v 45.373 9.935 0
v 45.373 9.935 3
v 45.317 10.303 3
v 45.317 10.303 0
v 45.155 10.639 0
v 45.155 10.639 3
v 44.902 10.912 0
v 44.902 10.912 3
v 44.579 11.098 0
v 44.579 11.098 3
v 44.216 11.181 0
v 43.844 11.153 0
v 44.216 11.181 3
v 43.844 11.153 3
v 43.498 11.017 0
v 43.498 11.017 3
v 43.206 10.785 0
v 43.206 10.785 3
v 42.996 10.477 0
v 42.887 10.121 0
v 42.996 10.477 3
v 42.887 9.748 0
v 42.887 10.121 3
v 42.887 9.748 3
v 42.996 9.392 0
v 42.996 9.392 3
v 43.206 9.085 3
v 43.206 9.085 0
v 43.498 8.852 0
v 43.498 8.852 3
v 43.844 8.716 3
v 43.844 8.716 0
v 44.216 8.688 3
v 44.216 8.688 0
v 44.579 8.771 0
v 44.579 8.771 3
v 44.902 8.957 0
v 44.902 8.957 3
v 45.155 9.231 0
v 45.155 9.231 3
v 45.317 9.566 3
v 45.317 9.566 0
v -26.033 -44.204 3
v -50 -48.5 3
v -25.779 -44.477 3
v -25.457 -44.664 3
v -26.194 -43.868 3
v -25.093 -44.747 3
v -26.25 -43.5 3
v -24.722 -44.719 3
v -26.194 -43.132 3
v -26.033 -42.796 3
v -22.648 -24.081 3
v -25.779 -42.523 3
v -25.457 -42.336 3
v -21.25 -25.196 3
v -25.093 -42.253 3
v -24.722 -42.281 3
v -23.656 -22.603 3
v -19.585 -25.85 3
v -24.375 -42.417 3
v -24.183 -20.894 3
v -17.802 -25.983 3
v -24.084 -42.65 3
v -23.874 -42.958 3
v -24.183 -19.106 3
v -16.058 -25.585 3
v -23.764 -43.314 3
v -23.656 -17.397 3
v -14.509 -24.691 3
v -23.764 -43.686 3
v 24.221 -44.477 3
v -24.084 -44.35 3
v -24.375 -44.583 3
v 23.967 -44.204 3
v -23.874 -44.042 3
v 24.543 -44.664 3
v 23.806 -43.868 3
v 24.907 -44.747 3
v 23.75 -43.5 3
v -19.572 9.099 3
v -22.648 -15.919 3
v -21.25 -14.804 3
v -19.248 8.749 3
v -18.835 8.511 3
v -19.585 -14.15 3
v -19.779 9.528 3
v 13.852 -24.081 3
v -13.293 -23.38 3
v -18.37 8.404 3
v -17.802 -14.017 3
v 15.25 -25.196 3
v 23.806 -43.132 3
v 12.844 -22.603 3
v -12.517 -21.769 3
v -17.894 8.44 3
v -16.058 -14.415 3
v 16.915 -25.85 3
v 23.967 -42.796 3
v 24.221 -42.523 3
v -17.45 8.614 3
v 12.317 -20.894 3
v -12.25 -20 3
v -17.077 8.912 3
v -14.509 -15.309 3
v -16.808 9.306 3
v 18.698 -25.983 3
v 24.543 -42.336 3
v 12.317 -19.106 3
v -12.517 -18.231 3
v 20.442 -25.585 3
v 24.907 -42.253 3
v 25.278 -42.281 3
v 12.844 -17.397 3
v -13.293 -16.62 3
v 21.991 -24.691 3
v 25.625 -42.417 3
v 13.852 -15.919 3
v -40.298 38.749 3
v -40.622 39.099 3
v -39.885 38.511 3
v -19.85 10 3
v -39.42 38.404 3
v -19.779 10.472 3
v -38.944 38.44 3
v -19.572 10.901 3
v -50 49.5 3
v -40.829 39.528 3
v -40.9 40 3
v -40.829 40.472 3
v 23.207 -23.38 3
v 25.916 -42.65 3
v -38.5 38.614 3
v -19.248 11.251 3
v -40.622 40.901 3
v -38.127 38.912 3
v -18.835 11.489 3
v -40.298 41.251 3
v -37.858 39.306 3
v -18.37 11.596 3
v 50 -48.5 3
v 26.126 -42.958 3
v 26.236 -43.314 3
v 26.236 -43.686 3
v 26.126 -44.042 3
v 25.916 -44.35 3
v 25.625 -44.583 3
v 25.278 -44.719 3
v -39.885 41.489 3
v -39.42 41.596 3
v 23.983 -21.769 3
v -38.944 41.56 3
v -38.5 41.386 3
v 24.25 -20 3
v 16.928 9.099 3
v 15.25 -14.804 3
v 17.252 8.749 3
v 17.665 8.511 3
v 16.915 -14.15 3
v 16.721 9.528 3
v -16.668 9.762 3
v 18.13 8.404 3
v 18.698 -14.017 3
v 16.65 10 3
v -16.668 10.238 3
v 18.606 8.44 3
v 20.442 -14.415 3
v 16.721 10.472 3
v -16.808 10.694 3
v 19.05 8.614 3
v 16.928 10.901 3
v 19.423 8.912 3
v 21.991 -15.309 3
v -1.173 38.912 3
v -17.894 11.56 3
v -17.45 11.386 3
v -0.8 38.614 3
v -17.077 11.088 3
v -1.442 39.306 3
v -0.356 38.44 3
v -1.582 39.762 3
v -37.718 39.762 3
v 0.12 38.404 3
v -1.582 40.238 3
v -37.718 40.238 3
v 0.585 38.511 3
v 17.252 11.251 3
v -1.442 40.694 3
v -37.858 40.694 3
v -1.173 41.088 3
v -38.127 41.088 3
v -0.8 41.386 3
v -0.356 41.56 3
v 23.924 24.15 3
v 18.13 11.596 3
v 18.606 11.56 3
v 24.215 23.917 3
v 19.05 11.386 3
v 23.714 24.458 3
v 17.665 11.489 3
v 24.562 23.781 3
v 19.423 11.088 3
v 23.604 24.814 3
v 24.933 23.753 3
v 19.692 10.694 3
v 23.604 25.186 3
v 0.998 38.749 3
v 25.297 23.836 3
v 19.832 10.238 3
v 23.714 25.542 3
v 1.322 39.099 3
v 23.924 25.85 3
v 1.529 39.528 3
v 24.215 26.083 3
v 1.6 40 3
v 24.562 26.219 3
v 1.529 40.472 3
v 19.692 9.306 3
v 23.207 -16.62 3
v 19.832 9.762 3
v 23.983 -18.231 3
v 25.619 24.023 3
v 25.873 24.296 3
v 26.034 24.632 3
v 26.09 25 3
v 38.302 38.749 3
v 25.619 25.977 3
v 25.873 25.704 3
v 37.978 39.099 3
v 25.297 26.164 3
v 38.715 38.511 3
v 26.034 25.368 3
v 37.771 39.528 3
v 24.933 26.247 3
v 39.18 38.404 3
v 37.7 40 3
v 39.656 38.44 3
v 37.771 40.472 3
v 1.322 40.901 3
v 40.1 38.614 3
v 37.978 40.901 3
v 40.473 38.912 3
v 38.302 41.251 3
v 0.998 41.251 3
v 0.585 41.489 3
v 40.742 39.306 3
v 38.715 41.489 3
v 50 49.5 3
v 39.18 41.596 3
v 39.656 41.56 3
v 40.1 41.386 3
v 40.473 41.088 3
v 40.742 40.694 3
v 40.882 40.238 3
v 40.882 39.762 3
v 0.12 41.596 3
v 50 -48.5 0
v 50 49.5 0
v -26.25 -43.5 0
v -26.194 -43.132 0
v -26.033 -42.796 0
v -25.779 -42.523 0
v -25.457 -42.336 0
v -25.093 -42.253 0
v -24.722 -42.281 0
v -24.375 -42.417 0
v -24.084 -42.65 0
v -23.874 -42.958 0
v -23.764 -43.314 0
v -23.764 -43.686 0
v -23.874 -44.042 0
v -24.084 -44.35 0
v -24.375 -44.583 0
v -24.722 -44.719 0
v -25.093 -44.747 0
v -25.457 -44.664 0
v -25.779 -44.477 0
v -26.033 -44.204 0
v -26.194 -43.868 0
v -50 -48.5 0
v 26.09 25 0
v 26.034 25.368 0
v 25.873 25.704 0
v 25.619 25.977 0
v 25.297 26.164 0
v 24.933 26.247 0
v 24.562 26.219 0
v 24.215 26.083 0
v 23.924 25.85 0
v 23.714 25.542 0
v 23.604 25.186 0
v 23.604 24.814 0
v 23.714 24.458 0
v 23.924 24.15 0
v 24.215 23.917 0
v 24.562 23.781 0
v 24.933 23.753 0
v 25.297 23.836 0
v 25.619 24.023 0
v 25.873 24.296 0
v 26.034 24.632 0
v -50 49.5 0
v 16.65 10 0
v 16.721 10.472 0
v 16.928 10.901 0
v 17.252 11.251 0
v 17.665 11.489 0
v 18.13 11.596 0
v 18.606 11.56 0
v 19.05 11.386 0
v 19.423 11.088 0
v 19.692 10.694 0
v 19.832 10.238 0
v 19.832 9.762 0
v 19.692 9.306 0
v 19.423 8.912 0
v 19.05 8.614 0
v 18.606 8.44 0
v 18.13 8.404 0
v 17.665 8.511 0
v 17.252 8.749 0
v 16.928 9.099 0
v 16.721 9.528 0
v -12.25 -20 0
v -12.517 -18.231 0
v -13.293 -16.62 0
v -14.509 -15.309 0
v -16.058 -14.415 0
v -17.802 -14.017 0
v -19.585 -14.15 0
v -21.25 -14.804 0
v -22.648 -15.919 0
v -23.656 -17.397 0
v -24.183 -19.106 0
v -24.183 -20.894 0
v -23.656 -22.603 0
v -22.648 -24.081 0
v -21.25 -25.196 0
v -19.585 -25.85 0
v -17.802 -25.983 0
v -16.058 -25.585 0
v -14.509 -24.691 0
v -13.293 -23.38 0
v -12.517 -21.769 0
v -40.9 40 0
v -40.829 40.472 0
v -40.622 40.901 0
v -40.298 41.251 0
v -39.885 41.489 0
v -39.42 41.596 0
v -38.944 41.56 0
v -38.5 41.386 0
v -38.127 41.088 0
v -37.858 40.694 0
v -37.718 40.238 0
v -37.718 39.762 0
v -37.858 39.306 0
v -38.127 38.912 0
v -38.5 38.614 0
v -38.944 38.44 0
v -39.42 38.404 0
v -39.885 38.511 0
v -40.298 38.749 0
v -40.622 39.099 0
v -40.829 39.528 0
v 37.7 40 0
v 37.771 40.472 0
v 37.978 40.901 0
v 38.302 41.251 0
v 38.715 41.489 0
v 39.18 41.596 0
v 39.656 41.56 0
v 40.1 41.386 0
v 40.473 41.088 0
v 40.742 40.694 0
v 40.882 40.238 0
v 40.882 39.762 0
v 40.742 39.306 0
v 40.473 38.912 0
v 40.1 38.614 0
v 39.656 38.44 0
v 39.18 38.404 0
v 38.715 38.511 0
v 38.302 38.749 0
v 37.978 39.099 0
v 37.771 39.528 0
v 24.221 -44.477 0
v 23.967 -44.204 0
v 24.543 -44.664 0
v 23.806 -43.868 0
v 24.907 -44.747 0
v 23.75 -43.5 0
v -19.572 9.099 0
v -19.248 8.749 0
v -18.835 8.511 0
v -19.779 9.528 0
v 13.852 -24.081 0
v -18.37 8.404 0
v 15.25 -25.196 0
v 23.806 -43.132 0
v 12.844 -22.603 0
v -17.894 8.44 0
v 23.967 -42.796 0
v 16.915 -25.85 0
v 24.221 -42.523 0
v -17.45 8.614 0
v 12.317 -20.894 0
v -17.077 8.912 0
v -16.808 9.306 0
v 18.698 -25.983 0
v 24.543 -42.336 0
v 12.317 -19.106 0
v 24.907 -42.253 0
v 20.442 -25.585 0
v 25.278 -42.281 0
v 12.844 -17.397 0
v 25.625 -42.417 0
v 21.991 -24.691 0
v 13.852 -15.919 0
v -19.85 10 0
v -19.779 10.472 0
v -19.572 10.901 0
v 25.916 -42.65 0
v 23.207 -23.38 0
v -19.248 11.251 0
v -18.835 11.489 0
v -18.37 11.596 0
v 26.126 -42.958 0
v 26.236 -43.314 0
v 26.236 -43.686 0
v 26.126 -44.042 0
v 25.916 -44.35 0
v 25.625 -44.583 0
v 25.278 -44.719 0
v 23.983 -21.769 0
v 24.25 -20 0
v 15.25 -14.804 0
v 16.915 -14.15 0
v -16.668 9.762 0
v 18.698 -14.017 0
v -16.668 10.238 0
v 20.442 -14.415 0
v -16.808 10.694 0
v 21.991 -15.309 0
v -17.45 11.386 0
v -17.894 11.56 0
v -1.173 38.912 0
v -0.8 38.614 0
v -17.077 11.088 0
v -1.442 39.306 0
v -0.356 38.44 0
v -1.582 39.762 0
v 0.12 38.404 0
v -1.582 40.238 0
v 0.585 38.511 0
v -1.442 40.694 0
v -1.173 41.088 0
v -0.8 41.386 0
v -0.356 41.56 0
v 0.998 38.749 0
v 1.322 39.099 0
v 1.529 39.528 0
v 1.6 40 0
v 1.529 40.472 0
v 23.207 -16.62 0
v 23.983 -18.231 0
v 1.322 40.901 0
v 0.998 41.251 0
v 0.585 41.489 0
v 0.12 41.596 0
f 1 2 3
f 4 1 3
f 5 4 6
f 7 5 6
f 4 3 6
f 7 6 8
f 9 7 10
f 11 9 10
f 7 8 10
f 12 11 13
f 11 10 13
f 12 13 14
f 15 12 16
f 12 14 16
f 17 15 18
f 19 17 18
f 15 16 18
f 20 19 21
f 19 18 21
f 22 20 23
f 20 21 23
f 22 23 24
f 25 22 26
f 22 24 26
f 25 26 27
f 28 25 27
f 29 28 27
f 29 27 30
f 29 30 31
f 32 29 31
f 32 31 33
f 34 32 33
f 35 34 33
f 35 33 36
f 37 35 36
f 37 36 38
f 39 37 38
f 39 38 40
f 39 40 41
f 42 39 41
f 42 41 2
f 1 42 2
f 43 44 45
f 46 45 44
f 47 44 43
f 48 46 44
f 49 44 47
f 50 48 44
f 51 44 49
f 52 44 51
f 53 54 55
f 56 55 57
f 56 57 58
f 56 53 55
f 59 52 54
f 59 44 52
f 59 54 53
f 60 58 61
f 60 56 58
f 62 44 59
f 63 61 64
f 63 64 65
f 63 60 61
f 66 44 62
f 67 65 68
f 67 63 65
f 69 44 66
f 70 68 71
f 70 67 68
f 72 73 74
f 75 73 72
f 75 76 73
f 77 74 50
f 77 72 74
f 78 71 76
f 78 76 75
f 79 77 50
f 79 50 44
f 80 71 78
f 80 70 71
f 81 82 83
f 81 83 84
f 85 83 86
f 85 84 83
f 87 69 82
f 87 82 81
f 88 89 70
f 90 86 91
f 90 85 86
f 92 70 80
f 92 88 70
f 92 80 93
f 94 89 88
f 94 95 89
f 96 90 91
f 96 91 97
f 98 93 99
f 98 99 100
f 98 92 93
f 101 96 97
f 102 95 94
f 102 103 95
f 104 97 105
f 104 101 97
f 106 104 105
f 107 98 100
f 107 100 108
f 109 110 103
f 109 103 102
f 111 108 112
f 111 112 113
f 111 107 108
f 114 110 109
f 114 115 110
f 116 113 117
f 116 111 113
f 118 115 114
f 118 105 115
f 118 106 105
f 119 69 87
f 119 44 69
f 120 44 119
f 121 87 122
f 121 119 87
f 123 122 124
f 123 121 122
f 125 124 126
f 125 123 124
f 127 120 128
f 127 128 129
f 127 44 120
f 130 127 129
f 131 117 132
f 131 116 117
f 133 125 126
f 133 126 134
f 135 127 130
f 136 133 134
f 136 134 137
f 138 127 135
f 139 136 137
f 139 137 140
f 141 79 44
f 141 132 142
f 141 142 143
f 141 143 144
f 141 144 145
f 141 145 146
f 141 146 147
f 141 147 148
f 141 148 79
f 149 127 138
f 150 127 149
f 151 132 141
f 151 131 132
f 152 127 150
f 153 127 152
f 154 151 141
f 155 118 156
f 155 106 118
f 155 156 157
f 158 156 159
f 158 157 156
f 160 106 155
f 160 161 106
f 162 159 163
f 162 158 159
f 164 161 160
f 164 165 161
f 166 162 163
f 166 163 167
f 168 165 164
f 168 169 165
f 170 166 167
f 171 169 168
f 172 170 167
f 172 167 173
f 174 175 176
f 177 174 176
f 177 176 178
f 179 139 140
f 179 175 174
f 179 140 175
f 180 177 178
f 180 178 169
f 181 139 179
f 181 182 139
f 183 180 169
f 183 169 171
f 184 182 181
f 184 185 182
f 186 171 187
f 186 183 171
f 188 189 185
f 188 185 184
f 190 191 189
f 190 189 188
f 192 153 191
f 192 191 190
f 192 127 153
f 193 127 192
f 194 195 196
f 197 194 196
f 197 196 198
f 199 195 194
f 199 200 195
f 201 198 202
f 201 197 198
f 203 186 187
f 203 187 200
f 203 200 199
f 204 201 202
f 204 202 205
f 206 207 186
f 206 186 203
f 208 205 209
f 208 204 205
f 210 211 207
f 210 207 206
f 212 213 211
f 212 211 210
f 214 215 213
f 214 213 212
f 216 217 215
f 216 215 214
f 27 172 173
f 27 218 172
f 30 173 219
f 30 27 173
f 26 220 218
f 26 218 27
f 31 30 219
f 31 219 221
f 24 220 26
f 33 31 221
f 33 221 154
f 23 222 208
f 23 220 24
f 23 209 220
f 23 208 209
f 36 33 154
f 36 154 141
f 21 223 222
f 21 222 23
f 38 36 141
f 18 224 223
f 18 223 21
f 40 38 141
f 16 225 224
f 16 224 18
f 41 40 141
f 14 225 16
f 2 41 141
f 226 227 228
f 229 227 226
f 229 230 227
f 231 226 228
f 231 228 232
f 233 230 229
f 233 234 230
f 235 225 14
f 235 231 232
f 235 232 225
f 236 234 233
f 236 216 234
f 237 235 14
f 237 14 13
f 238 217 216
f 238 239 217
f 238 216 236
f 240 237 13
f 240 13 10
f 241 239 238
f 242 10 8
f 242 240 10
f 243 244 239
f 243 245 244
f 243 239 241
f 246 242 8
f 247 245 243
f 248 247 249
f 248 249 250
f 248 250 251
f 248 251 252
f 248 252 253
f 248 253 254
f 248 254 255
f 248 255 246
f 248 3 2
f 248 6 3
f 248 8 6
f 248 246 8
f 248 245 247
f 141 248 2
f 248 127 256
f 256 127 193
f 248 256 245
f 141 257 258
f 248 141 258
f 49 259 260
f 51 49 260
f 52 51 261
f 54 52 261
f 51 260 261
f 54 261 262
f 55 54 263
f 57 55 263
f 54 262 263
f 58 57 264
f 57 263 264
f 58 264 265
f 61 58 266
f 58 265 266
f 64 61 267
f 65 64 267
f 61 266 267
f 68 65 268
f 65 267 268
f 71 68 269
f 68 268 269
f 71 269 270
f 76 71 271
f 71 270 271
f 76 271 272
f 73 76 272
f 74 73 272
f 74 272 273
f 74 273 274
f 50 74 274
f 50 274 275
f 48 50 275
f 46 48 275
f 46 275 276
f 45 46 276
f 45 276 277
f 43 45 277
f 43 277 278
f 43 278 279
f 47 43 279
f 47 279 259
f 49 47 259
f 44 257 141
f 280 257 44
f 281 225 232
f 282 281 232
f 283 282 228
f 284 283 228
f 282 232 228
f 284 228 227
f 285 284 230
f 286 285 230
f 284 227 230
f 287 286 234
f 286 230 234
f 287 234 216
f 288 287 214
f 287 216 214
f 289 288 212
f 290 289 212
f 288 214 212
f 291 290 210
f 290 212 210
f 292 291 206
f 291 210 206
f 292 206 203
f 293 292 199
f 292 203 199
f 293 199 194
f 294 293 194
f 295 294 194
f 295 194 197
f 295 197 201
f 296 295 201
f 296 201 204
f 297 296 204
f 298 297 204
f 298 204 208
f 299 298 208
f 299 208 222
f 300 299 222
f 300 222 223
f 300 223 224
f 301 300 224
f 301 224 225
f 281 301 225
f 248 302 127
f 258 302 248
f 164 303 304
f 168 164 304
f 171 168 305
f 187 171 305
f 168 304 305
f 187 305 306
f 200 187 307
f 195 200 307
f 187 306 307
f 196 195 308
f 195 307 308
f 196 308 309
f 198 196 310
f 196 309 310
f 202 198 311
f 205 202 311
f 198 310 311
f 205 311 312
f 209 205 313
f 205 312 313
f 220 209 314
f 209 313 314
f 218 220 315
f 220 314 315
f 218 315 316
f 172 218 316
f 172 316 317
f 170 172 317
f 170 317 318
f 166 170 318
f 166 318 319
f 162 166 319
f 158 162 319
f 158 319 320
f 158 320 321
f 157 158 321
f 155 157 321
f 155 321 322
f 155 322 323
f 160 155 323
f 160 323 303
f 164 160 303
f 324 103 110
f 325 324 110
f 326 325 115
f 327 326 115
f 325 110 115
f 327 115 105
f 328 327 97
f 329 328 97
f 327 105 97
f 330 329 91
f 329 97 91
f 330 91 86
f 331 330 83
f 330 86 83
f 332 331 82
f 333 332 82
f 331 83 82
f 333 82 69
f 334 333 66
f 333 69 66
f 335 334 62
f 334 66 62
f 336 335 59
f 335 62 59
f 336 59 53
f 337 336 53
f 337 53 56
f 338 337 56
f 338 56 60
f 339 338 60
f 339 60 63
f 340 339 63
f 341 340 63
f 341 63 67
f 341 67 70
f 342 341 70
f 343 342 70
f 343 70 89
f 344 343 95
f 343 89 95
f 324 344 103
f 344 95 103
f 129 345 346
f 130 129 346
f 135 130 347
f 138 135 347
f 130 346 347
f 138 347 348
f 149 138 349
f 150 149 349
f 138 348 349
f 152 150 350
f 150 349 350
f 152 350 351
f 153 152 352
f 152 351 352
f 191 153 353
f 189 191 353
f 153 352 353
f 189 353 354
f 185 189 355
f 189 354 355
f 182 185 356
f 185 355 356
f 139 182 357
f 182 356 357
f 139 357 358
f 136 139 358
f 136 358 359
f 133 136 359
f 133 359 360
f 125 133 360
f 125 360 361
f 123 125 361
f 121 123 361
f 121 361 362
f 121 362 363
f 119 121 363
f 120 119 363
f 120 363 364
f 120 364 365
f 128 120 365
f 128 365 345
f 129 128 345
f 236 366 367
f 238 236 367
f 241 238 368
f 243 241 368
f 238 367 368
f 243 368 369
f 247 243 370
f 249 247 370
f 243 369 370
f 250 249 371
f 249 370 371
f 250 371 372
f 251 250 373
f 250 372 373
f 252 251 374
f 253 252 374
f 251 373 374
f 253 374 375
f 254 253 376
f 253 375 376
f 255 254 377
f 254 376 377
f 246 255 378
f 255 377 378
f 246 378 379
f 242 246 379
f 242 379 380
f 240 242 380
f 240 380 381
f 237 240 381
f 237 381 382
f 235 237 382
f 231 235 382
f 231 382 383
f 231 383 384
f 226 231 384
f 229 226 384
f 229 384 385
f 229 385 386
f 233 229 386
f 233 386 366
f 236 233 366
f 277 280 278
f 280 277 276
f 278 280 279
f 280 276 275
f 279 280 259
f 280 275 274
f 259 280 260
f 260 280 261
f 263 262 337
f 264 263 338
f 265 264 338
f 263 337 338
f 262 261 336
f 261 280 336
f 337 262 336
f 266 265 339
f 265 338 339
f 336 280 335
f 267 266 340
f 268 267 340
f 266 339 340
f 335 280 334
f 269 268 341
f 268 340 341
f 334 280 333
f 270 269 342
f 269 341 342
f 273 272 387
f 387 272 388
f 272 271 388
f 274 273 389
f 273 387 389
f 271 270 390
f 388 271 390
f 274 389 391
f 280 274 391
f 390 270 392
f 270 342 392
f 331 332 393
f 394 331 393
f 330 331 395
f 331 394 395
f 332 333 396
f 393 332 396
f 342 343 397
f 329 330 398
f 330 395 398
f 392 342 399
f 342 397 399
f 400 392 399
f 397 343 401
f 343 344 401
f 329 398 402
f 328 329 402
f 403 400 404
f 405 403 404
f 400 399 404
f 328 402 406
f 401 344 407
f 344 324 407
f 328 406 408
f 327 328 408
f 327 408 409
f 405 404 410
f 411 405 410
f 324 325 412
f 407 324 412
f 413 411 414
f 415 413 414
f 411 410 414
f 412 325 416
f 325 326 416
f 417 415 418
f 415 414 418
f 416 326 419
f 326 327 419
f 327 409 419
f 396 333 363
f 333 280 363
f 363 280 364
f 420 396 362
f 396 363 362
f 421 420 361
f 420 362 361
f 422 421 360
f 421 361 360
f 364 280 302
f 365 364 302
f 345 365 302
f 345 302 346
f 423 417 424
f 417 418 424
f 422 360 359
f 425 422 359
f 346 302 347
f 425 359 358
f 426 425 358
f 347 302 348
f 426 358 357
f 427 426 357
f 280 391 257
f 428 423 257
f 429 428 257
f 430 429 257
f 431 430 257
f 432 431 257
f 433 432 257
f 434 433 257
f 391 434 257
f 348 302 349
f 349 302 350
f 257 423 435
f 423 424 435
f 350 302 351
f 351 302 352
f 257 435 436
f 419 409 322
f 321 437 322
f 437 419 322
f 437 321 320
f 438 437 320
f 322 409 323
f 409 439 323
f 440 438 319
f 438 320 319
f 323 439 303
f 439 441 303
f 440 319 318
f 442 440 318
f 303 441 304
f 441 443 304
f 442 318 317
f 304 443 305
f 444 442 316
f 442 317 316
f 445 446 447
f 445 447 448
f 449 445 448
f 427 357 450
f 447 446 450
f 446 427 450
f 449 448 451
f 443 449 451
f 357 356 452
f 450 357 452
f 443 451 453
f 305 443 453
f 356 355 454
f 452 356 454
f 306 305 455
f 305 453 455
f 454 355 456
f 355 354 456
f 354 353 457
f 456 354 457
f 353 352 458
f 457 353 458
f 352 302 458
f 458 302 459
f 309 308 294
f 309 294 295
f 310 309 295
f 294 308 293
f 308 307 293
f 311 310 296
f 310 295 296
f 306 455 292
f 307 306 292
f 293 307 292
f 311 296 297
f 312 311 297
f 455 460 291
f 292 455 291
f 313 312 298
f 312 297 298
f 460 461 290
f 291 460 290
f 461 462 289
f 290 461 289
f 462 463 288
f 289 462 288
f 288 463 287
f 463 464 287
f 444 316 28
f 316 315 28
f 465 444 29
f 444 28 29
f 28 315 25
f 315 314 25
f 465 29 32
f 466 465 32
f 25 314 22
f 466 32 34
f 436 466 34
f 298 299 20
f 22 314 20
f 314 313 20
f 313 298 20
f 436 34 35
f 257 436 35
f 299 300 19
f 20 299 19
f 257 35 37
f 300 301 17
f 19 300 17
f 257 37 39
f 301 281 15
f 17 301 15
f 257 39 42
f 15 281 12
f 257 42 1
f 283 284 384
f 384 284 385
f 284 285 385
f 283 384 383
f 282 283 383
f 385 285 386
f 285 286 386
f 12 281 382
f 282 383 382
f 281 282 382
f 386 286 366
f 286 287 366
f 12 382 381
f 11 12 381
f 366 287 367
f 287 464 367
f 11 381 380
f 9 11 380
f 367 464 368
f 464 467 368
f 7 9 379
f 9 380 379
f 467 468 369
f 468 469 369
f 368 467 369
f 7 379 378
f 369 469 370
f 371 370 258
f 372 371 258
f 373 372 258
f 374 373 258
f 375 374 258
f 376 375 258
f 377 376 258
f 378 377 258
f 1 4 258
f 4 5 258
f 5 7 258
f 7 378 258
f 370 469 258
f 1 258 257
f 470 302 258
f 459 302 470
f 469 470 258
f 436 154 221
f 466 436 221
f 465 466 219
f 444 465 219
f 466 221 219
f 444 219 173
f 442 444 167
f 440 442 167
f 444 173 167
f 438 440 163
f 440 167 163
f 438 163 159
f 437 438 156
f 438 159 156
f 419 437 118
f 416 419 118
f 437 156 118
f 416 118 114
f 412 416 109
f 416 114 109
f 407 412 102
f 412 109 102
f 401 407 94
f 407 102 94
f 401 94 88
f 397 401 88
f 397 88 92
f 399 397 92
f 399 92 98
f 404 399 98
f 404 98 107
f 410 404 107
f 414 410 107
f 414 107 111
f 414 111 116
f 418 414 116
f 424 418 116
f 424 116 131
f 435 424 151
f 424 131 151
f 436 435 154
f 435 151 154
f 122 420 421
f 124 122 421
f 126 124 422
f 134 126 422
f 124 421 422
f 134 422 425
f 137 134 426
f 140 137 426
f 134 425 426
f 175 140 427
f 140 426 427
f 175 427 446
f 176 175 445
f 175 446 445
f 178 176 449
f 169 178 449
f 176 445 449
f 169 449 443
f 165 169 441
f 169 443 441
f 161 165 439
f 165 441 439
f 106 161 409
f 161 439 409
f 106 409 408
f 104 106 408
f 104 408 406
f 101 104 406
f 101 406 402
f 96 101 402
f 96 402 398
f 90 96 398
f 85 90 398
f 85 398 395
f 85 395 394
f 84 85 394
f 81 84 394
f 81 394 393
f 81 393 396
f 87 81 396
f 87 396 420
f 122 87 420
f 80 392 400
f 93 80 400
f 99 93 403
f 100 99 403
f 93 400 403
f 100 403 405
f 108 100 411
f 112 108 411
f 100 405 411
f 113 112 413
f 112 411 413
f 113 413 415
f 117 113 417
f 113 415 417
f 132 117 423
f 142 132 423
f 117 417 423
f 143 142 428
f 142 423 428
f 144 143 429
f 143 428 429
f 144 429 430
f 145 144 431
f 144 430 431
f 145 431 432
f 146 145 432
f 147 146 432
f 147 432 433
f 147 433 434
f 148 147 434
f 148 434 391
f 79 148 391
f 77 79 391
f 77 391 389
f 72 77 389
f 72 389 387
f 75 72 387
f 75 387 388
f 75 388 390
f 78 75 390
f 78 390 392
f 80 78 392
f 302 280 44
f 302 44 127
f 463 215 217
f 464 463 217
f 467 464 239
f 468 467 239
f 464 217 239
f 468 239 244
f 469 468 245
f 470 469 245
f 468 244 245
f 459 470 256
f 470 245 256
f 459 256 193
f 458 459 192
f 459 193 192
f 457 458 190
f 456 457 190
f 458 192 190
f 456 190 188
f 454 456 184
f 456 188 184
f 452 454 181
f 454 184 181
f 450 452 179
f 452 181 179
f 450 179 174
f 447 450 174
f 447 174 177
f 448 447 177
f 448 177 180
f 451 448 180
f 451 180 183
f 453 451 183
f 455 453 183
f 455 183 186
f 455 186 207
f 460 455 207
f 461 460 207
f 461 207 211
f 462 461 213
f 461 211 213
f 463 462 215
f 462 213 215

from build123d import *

# Parameters (mm, degrees)
SKETCH_1_W          = 100
SKETCH_1_H          = 99
EXTRUDE_1_DEPTH     = 3
SKETCH_2_R          = 6
SKETCH_2_R_2        = 1.6
CUT_EXTRUDE_1_DEPTH = 3
SKETCH_4_W          = 131.961579061
SKETCH_4_H          = 16.810392237
CUT_EXTRUDE_2_DEPTH = 1
M3X0_5_4_D          = 2.5
M3X0_5_4_DEPTH      = 8.5
M3X0_5_4_TIP        = 0.751075774
M3X0_5_5_D          = 2.5
M3X0_5_5_DEPTH      = 8.5
M3X0_5_5_TIP        = 0.751075774
SKETCH_11_R         = 1.6
CUT_EXTRUDE_3_DEPTH = 10
SKETCH_12_R         = 1.6
CUT_EXTRUDE_4_DEPTH = 10


with BuildPart() as part:
    # ｽｹｯﾁ1 → ﾎﾞｽ - 押し出し1 (new body)
    with BuildSketch(Plane.XY):
        Rectangle(SKETCH_1_W, SKETCH_1_H)
    extrude(amount=EXTRUDE_1_DEPTH)

    # ｽｹｯﾁ2 → ｶｯﾄ - 押し出し1 (cut)
    with BuildSketch(Plane.XY.offset(3)):
        with Locations((-18.25, -20)):
            Circle(SKETCH_2_R)
        with Locations((18.25, -20)):
            Circle(SKETCH_2_R)
        with Locations((0, 40)):
            Circle(SKETCH_2_R_2)
    extrude(amount=-CUT_EXTRUDE_1_DEPTH, mode=Mode.SUBTRACT)

    # ｽｹｯﾁ4 → ｶｯﾄ - 押し出し2 (cut)
    with BuildSketch(Plane(origin=(0, -49.5, 0), x_dir=(-1, 0, 0), z_dir=(0, -1, 0))):
        with Locations((0.945584564, -1.132272669)):
            Rectangle(SKETCH_4_W, SKETCH_4_H)
    extrude(amount=-CUT_EXTRUDE_2_DEPTH, mode=Mode.SUBTRACT)

    # M3x0.5 ねじ穴4
    with Locations(Plane(origin=(25, -43.5, 3), x_dir=(1, 0, 0), z_dir=(0, 0, 1))):
        with Locations((0, 0), (-50, 0)):
            Hole(M3X0_5_4_D / 2, depth=M3X0_5_4_DEPTH)
            with Locations((0, 0, -(M3X0_5_4_DEPTH + M3X0_5_4_TIP / 2))):  # 118° drill point
                Cone(0, M3X0_5_4_D / 2, M3X0_5_4_TIP, mode=Mode.SUBTRACT)

    # M3x0.5 ねじ穴5
    with Locations(Plane(origin=(44.122623141, 9.934763699, 0), x_dir=(-1, 0, 0), z_dir=(0, 0, -1))):
        with Locations((0, 0), (19.282623141, 15.065236301)):
            Hole(M3X0_5_5_D / 2, depth=M3X0_5_5_DEPTH)
            with Locations((0, 0, -(M3X0_5_5_DEPTH + M3X0_5_5_TIP / 2))):  # 118° drill point
                Cone(0, M3X0_5_5_D / 2, M3X0_5_5_TIP, mode=Mode.SUBTRACT)

    # ｽｹｯﾁ11 → ｶｯﾄ - 押し出し3 (cut)
    with BuildSketch(Plane(origin=(0, 0, 0), x_dir=(-1, 0, 0), z_dir=(0, 0, -1))):
        with Locations((18.25, 10)):
            Circle(SKETCH_11_R)
        with Locations((-18.25, 10)):
            Circle(SKETCH_11_R)
    extrude(amount=-CUT_EXTRUDE_3_DEPTH, mode=Mode.SUBTRACT)

    # ｽｹｯﾁ12 → ｶｯﾄ - 押し出し4 (cut)
    with BuildSketch(Plane(origin=(0, 0, 0), x_dir=(-1, 0, 0), z_dir=(0, 0, -1))):
        with Locations((-39.3, 40)):
            Circle(SKETCH_12_R)
        with Locations((39.3, 40)):
            Circle(SKETCH_12_R)
    extrude(amount=-CUT_EXTRUDE_4_DEPTH, mode=Mode.SUBTRACT)


solid = part.part
